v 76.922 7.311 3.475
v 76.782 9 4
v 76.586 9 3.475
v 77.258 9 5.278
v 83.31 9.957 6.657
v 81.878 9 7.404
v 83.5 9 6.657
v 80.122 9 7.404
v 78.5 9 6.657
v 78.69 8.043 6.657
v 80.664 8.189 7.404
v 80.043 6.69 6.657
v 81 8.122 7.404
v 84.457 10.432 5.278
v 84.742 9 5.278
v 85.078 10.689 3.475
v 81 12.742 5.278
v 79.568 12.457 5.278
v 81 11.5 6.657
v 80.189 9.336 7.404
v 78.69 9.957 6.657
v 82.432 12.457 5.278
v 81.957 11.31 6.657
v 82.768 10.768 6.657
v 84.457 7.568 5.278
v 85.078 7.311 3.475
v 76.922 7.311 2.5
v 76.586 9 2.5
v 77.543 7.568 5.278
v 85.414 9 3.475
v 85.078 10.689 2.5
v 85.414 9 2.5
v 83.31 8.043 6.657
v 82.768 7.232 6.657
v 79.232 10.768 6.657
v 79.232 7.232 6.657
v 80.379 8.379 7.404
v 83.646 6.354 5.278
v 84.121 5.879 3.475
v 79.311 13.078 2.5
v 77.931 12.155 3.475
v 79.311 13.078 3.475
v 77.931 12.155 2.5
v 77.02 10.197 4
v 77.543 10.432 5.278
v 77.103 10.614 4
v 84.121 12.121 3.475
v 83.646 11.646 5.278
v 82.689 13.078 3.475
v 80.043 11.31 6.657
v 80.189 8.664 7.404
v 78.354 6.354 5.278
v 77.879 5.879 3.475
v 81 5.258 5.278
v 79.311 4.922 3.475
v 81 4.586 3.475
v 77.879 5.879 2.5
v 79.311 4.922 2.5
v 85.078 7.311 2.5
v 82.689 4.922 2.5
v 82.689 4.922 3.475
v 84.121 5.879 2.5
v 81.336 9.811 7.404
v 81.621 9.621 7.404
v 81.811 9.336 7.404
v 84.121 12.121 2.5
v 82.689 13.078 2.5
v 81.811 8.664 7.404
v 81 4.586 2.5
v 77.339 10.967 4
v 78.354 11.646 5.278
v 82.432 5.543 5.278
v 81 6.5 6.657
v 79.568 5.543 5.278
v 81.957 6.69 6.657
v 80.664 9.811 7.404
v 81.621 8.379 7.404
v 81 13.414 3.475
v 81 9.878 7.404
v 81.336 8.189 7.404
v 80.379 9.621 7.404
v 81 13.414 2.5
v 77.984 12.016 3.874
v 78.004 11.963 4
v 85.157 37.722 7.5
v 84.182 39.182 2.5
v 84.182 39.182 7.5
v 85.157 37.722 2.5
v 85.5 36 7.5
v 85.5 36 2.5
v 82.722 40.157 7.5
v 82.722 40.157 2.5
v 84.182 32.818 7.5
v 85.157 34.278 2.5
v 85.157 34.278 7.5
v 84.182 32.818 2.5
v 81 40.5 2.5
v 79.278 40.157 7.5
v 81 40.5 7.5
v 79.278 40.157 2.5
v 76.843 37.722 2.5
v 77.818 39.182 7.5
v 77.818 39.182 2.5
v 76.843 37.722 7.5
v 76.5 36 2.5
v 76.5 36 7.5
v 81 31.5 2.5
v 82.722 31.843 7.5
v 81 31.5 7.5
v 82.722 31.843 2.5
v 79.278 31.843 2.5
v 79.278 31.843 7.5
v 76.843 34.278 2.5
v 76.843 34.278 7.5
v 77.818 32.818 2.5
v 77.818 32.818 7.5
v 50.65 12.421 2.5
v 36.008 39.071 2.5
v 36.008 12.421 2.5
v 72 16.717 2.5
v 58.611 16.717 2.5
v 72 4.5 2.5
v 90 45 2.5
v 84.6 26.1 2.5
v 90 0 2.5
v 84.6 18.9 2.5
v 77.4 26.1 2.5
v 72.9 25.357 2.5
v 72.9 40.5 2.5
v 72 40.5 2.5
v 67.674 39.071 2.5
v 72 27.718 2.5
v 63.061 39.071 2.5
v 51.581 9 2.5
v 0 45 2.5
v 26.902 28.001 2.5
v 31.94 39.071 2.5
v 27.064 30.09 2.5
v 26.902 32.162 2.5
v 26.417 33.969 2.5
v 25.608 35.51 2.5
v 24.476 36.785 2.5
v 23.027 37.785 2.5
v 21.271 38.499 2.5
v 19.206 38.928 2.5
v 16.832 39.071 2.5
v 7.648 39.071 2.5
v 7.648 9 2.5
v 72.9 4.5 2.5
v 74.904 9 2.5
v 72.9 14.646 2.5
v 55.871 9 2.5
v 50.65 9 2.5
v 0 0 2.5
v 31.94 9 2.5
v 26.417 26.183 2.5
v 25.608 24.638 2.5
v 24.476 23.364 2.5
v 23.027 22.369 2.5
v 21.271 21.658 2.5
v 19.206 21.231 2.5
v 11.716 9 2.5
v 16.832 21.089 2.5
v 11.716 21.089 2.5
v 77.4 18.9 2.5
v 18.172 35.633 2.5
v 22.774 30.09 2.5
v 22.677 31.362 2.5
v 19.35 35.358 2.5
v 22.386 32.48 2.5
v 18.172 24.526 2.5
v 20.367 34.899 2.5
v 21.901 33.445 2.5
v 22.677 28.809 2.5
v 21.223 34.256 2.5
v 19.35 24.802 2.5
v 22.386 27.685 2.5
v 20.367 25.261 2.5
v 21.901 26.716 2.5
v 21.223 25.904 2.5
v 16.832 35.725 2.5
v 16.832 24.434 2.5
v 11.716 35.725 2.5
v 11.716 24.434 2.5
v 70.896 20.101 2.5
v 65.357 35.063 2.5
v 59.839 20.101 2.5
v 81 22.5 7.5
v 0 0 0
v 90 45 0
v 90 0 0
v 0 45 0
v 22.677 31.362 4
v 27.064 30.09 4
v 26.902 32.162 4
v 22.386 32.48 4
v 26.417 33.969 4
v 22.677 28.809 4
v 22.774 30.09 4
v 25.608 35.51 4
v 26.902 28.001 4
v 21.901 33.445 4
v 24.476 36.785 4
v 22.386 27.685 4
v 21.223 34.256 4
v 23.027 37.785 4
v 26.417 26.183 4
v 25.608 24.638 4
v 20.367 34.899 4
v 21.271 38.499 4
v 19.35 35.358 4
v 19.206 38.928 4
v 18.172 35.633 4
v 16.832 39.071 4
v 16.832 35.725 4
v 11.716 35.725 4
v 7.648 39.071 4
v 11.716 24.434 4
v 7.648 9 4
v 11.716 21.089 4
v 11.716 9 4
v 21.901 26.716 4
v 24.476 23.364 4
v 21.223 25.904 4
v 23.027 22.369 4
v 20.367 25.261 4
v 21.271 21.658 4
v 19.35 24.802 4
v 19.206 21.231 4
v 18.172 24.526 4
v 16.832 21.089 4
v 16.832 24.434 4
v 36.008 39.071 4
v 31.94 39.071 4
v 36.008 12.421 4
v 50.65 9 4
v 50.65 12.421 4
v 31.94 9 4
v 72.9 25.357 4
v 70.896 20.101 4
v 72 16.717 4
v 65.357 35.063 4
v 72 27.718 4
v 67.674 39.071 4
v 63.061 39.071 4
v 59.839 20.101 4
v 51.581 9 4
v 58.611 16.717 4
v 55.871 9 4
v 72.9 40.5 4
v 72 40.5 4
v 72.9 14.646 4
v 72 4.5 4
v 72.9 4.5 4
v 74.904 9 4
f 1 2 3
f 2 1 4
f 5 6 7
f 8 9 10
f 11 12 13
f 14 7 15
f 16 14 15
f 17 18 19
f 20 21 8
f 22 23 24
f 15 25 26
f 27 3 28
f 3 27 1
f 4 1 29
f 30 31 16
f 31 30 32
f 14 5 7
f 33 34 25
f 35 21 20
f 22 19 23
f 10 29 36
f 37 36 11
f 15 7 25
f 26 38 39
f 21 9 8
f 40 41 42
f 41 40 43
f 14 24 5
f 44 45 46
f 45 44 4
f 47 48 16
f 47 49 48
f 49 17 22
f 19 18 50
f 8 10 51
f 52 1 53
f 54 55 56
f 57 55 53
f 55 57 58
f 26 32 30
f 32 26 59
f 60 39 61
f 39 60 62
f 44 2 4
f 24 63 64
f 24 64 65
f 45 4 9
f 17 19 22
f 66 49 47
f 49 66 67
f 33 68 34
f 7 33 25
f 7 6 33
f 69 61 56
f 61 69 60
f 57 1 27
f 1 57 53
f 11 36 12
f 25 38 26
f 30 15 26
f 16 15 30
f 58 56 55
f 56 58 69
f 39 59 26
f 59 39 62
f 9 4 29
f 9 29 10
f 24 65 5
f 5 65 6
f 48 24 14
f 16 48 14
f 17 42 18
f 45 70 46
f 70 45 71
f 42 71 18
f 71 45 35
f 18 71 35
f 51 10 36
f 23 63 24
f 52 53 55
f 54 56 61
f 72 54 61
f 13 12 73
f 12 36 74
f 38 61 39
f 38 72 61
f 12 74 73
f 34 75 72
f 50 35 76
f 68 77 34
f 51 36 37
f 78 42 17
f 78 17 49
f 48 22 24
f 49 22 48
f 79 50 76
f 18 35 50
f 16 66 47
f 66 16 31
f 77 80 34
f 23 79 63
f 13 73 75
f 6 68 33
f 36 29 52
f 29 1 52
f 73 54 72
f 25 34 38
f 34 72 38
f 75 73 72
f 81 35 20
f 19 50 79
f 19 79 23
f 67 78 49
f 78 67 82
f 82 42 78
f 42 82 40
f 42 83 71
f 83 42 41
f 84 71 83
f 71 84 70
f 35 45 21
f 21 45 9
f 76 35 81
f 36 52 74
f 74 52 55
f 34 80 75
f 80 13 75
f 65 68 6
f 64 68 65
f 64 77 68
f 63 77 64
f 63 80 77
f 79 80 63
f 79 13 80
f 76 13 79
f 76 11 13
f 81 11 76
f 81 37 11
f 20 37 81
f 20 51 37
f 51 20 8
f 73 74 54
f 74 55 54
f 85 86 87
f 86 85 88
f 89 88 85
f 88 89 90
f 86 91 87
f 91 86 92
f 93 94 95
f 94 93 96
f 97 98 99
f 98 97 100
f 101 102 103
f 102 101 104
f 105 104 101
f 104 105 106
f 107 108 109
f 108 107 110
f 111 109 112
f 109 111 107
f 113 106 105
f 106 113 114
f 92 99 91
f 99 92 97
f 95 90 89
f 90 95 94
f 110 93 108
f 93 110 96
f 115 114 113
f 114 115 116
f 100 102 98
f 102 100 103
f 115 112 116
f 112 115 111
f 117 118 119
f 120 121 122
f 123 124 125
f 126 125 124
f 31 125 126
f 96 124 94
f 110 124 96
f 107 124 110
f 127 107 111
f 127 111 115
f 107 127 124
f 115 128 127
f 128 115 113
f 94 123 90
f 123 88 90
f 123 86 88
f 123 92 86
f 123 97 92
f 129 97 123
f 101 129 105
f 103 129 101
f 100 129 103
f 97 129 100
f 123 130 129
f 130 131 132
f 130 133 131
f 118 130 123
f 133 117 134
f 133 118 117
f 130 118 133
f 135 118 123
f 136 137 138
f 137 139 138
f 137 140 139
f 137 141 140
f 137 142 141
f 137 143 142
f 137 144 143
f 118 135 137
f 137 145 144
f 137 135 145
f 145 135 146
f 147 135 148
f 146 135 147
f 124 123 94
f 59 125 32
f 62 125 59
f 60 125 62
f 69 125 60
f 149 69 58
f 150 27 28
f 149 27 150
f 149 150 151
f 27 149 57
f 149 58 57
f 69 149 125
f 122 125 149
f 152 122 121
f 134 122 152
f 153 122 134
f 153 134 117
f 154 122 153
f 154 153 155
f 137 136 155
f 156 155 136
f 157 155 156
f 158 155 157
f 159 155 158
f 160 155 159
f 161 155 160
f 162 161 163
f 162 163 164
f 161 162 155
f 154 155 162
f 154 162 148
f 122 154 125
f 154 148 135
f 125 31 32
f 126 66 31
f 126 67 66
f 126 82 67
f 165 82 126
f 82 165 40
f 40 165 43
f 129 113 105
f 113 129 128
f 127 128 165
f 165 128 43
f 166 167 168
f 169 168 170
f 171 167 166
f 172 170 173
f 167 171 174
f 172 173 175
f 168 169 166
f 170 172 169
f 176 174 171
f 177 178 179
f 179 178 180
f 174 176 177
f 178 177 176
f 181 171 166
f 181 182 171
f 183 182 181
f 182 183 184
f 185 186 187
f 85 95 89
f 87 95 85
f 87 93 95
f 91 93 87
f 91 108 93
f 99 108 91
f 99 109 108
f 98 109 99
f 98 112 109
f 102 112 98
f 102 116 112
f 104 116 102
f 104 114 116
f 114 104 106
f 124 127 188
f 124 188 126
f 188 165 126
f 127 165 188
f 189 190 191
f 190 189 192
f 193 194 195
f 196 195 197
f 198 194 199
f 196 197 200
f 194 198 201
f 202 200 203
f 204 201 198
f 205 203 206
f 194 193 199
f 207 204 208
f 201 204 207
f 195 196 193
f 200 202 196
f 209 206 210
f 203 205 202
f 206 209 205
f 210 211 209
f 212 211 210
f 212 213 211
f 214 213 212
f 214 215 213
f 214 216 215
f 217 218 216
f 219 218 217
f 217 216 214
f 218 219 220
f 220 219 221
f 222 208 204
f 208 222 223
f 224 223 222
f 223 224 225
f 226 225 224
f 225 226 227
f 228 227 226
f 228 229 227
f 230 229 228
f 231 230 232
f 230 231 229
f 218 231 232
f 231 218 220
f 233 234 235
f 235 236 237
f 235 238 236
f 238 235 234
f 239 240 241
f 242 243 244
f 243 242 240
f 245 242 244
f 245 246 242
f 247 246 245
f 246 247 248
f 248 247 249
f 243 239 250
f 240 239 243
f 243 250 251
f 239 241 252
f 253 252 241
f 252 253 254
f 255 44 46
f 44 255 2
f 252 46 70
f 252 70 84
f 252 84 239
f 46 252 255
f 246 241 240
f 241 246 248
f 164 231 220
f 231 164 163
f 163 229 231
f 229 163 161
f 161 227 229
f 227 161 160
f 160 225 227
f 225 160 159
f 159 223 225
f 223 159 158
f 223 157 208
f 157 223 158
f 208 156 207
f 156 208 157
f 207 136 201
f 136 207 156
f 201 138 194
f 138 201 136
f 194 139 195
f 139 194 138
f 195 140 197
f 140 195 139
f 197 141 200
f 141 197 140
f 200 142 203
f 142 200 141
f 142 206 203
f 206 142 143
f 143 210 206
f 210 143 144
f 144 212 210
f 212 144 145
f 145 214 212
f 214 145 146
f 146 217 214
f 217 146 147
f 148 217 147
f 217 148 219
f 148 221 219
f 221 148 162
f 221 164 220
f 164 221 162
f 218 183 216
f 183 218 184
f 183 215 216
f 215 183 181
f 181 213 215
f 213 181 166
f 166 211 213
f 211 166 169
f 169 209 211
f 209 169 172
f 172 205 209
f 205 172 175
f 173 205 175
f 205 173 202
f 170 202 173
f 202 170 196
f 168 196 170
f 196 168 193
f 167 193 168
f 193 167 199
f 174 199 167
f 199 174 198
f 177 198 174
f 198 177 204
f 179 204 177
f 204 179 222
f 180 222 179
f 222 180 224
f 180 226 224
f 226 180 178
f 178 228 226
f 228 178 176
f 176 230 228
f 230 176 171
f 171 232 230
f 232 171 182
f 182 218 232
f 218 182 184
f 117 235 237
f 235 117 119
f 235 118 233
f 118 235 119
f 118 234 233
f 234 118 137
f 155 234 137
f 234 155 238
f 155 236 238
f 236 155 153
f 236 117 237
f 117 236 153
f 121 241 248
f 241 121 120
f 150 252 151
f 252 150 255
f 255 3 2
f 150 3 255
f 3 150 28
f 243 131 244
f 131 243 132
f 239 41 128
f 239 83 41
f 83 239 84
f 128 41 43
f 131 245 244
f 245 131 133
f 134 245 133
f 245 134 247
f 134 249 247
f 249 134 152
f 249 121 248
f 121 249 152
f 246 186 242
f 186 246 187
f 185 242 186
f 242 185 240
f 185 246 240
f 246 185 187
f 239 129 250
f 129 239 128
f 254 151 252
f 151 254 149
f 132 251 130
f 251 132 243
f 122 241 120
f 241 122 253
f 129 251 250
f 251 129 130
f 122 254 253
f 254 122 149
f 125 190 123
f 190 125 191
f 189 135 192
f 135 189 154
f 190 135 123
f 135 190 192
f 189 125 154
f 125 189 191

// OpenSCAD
pThickness = 2.5;


module testThingies() {
	xTranslation = 90;
	intersection() {
		union() {
			translate([xTranslation, 10, pThickness]) sphere(r = 5);

			translate([xTranslation, 40, pThickness]) cylinder(r = 5, h = 5);

			translate([xTranslation - 4, 25 - 4, pThickness]) polyhedron(points = [ [0,0,0], [8,0,0], [8,8,0], [0,8,0], [4, 4, 5]], faces = [[0, 1, 2, 3], [4, 2, 1], [4, 3, 2], [4, 0, 3], [4, 1, 0]]);

		}

		cube([100, 60, 60]);
	}
}

module sepLine() {
	xPosition = 80;
	yDist = 5;

	translate([xPosition, yDist, pThickness]) cube([1, 50 - yDist*2, 1.5]);
}

module emblem() {
	translate([4, 10, pThickness]) linear_extrude(height = 1.5) text("PLA", font = "Gentium Book Basic", size = 33); // "Gentium Book Basic"
}

resize([90, 0, 7.5], auto = true) {
	emblem();
	sepLine();
	testThingies();
	cube([100, 50, pThickness]);
}
